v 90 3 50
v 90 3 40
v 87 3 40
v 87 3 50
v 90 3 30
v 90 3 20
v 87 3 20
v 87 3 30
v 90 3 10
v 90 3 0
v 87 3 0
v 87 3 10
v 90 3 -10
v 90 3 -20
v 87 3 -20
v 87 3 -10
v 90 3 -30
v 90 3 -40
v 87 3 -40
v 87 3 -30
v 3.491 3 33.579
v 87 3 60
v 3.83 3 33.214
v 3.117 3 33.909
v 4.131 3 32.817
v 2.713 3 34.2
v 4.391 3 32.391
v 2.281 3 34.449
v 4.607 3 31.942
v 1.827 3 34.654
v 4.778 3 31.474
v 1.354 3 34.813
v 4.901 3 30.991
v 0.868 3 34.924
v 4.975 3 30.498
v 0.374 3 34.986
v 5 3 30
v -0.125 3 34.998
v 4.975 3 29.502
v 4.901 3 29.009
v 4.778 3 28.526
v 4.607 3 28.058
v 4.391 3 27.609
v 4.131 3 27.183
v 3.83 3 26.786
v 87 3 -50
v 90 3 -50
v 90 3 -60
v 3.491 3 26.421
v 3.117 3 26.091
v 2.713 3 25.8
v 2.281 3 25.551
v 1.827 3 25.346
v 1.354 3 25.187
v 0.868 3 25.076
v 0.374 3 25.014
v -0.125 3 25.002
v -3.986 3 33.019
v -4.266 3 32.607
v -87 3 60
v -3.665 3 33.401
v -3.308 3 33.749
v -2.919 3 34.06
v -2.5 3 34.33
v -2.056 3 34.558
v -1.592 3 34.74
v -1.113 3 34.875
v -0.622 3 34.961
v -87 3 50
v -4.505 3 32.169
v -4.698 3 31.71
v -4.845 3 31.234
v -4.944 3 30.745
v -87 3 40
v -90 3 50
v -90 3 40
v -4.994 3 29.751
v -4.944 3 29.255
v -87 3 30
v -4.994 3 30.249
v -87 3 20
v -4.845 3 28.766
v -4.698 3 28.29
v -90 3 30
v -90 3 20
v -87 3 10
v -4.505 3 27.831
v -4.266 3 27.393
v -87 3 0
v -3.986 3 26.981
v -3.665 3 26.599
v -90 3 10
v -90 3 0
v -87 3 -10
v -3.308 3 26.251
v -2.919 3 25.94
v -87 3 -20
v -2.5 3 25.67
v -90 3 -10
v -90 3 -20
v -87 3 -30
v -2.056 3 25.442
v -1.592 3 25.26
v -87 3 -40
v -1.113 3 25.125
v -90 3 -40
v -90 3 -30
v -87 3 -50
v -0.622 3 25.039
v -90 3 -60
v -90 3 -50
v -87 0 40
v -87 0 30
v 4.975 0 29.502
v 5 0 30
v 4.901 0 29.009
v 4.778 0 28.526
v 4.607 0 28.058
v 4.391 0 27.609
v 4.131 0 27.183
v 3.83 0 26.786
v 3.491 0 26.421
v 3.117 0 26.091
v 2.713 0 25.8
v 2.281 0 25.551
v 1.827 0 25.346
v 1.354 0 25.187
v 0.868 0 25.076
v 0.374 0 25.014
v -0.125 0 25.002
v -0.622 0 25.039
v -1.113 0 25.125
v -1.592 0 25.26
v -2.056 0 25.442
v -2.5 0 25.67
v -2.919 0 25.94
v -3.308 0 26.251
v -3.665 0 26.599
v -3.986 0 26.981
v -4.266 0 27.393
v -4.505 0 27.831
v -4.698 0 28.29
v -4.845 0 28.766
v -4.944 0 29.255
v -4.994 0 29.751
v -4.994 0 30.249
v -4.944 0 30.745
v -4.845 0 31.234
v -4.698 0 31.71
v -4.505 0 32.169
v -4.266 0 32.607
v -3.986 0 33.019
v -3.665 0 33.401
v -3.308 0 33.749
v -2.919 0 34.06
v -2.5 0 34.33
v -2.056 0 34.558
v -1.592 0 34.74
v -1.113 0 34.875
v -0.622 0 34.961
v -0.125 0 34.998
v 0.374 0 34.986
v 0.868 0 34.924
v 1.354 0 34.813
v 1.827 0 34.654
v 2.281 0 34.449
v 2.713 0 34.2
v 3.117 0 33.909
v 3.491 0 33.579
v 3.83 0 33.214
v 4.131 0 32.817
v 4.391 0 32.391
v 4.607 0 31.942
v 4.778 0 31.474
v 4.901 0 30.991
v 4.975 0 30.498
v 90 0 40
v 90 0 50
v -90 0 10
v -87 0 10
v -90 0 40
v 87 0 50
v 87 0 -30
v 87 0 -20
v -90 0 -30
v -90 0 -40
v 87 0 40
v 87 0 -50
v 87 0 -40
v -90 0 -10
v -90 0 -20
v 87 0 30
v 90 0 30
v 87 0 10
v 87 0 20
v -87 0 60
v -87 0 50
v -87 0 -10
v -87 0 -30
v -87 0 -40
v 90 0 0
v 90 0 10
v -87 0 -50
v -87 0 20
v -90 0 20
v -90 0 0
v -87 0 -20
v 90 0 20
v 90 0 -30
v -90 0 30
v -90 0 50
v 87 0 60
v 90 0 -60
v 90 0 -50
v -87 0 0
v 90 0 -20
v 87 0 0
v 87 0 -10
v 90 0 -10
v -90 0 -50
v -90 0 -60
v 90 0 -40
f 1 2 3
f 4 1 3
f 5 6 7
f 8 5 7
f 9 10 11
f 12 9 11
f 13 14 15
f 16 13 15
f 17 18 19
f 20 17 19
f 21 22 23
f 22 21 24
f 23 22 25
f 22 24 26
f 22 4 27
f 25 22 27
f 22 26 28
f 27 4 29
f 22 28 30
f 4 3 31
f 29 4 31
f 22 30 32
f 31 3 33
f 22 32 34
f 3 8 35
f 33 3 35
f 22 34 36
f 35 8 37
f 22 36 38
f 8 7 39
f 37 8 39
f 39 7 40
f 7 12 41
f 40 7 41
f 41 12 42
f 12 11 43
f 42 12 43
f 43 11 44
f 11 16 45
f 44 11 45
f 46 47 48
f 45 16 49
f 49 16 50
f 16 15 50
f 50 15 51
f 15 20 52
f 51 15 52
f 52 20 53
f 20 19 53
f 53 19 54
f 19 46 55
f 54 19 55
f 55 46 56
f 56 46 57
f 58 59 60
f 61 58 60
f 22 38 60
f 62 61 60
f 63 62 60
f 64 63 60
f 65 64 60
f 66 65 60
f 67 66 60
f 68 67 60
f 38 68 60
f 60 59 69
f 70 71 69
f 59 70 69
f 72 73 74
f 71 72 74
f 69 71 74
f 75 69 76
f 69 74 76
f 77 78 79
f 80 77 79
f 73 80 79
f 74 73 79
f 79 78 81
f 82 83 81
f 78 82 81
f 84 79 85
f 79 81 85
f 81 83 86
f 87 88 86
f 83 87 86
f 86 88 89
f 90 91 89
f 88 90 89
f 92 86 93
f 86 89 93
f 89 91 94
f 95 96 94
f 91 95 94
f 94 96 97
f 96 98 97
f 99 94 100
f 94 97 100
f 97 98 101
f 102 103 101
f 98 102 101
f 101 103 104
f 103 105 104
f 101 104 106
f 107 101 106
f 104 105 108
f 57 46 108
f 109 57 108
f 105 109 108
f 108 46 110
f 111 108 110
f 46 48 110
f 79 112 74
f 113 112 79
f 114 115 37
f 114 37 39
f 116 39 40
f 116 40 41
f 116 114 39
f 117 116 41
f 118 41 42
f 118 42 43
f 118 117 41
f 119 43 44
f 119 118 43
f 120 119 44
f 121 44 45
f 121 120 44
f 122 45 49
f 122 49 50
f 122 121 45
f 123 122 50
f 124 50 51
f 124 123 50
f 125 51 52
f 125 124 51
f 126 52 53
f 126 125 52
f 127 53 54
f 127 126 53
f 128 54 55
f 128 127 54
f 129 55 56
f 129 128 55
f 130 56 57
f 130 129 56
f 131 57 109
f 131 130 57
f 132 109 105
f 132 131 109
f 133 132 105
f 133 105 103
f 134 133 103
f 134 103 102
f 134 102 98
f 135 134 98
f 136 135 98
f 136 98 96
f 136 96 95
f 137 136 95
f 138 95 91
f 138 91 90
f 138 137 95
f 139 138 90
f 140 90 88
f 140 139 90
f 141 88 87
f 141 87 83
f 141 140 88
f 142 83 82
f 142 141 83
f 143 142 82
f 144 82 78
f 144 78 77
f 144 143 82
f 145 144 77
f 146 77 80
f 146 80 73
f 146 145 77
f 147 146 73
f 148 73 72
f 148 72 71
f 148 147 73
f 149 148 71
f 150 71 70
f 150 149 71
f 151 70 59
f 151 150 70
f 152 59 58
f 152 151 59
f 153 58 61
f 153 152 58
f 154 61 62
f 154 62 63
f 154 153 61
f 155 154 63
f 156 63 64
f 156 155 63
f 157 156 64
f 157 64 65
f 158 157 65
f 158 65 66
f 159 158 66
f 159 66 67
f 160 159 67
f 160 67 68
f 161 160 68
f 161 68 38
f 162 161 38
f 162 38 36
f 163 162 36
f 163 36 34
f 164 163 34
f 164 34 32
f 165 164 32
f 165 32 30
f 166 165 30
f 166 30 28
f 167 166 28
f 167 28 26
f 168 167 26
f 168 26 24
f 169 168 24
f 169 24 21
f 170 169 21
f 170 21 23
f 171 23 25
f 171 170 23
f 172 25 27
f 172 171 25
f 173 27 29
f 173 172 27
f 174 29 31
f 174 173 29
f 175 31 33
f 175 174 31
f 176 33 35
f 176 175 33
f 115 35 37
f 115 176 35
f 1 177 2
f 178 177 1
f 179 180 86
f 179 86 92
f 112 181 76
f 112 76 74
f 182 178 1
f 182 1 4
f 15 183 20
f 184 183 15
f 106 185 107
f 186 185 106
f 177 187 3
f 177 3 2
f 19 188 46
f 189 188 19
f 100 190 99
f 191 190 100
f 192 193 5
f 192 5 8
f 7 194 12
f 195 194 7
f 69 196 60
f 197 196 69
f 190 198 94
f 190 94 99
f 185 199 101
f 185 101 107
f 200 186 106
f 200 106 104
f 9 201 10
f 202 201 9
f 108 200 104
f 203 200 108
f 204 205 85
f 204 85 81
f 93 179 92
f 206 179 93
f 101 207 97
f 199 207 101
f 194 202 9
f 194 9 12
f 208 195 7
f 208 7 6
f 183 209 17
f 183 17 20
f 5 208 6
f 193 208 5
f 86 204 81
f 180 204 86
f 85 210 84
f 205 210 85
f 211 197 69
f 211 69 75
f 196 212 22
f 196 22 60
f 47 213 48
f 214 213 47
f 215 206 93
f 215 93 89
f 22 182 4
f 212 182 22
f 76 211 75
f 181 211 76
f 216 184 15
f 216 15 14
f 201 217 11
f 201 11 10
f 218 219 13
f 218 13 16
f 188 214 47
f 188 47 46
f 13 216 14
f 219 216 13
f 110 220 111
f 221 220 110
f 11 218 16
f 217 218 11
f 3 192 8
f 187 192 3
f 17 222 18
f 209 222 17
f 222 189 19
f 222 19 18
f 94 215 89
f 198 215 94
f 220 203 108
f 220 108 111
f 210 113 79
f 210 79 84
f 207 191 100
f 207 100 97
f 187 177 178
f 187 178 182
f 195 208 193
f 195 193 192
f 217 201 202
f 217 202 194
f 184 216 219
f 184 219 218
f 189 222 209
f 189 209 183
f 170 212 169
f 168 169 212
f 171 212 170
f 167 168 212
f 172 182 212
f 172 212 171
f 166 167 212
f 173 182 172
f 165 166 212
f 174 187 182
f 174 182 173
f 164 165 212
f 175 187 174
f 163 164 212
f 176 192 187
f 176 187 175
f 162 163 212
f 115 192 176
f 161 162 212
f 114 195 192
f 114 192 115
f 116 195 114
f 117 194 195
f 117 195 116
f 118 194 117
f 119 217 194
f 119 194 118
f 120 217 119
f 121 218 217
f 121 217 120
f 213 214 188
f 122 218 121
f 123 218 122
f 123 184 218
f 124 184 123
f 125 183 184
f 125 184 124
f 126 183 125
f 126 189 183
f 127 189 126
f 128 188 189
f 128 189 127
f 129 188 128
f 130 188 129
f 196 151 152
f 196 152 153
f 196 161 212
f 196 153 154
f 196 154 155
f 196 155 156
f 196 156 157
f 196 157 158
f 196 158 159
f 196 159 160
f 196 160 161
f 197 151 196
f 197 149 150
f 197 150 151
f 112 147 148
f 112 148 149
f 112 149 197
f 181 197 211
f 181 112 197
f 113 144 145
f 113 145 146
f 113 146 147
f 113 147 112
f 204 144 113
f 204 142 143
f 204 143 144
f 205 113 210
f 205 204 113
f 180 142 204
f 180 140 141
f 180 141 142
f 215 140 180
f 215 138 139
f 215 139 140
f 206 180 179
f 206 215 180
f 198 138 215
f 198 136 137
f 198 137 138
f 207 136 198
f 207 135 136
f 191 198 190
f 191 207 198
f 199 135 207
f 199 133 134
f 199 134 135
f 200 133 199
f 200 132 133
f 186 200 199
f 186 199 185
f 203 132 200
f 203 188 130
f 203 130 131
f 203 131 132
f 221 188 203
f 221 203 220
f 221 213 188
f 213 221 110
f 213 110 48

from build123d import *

# Parameters (mm, degrees)
ESQUISSE1_R        = 5
BOSS_EXTRU_1_DEPTH = 3


with BuildPart() as part:
    # Esquisse1 → Boss.-Extru.1 (new body)
    with BuildSketch(Plane(origin=(0, 0, 0), x_dir=(1, 0, 0), z_dir=(0, 1, 0))):
        Polygon((-90, 60), (90, 60), (90, 50), (87, 50), (87, 40), (90, 40), (90, 30), (87, 30), (87, 20), (90, 20), (90, 10), (87, 10), (87, 0), (90, 0), (90, -10), (87, -10), (87, -20), (90, -20), (90, -30), (87, -30), (87, -40), (90, -40), (90, -50), (87, -50), (87, -60), (-87, -60), (-87, -50), (-90, -50), (-90, -40), (-87, -40), (-87, -30), (-90, -30), (-90, -20), (-87, -20), (-87, -10), (-90, -10), (-90, 0), (-87, 0), (-87, 10), (-90, 10), (-90, 20), (-87, 20), (-87, 30), (-90, 30), (-90, 40), (-87, 40), (-87, 50), (-90, 50), align=None)
        with Locations((0, -30)):
            Circle(ESQUISSE1_R, mode=Mode.SUBTRACT)
    extrude(amount=BOSS_EXTRU_1_DEPTH)


solid = part.part
